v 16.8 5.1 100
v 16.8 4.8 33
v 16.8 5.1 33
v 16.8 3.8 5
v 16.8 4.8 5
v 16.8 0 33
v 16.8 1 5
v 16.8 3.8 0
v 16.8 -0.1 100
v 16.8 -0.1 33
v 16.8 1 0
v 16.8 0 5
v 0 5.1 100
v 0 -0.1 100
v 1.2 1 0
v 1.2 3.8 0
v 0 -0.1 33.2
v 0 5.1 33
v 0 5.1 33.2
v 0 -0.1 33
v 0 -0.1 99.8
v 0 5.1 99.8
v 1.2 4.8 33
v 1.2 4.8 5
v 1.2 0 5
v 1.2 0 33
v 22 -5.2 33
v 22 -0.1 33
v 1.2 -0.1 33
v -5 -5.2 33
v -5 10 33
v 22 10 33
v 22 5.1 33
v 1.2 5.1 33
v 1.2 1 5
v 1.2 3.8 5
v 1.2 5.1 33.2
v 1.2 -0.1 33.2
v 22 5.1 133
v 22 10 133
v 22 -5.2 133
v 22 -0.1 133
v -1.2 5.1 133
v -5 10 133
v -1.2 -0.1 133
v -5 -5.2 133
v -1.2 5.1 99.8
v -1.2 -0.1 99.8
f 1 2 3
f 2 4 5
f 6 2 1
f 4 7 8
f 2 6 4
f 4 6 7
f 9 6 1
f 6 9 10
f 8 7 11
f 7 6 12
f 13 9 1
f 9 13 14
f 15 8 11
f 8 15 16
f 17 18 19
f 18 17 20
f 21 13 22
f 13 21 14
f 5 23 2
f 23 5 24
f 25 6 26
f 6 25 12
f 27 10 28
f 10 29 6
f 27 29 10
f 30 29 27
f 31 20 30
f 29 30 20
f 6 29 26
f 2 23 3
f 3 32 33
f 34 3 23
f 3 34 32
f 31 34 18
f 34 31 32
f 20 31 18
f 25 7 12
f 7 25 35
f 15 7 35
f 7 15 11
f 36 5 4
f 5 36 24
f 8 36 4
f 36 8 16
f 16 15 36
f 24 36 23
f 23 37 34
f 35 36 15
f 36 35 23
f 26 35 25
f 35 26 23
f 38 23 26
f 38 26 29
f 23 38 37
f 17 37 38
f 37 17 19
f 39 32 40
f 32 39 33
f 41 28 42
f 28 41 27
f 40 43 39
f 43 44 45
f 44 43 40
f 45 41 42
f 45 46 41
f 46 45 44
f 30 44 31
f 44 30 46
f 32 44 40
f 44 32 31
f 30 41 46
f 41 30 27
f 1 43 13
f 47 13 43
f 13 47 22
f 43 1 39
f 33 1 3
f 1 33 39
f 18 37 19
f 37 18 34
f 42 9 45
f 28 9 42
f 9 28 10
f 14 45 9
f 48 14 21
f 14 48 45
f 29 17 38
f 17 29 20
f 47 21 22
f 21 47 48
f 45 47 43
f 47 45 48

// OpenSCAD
// Which one would you like to see?
part = "filler"; //[filler:Regular filler, topper:Top piece]

/* [Basic measurements] */
// Peg length
pegLength = 33;
// Top peg length
topPegLength = 30;
// Standart height
stdHeight = 100;
// Total glass missing width
totMissingWidth = 44;
// Glass thickness
glassThickness = 5;
// Enclosure thickness
thickness = 5;

/* [Fine Tuning] */
// Tolerance
tolerance = 0.4;

Print();

module Print()
{
    if (part == "filler")
    {
        Filler();
    }
    else if (part == "topper")
    {
        Topper();
    }
}

eps = tolerance / 2;

module Filler()
{
    Peg(stdHeight);
    translate([ 0, 0, pegLength ]) Enclosure(stdHeight);
}

module Topper()
{
    difference()
    {
        union()
        {
            Peg(stdHeight - topPegLength);
            translate([ 0, 0, pegLength ]) Enclosure(stdHeight - pegLength - topPegLength);
        }
        translate([ -5, -2 * eps, stdHeight - 5 ]) cube([ totMissingWidth / 2 - thickness + 10, 1 + 2 * eps, 10 ]);
        translate([ -5, glassThickness - 1 - eps, stdHeight - 5 ]) cube([ totMissingWidth / 2 - thickness + 10, 1 + 2 * eps, 10 ]);
        translate([ -4 + eps, -5, stdHeight - topPegLength + eps ]) cube([ 5, thickness + 10, pegLength + 5 + eps ]);
    }
}

module Peg(maxExpandedHeight)
{
    difference()
    {
        union()
        {
            cube([ totMissingWidth / 2 - thickness - eps, glassThickness - eps, stdHeight ]);
            translate([ 0, -2 * eps, pegLength ]) cube([ totMissingWidth / 2 - thickness - eps, glassThickness + 4 * eps, maxExpandedHeight - pegLength ]);
        }
        translate([ -5, -2 * eps, -5 ]) cube([ totMissingWidth / 2 - thickness + 10, 1 + 2 * eps, 10 ]);
        translate([ -5, glassThickness - 1 - eps, -5 ]) cube([ totMissingWidth / 2 - thickness + 10, 1 + 2 * eps, 10 ]);
        translate([ -4 + eps, -5, -5 ]) cube([ 5, thickness + 10, pegLength + 5 + eps ]);
    }
}

module Enclosure(height)
{
    translate([ -thickness, -thickness - eps, 0 ])
    {
        difference()
        {
            cube([ totMissingWidth / 2 + thickness, thickness * 2 + glassThickness + eps, height ]);
            translate([ thickness, thickness + eps / 2, -5 ]) cube([ totMissingWidth / 2 + thickness, glassThickness + eps, height + 10 ]);
            translate([ thickness - 1 - eps, thickness + eps / 2, stdHeight - pegLength - eps ]) cube([ totMissingWidth / 2 + thickness, glassThickness + eps, pegLength + 5 ]);
        }
    }
}
